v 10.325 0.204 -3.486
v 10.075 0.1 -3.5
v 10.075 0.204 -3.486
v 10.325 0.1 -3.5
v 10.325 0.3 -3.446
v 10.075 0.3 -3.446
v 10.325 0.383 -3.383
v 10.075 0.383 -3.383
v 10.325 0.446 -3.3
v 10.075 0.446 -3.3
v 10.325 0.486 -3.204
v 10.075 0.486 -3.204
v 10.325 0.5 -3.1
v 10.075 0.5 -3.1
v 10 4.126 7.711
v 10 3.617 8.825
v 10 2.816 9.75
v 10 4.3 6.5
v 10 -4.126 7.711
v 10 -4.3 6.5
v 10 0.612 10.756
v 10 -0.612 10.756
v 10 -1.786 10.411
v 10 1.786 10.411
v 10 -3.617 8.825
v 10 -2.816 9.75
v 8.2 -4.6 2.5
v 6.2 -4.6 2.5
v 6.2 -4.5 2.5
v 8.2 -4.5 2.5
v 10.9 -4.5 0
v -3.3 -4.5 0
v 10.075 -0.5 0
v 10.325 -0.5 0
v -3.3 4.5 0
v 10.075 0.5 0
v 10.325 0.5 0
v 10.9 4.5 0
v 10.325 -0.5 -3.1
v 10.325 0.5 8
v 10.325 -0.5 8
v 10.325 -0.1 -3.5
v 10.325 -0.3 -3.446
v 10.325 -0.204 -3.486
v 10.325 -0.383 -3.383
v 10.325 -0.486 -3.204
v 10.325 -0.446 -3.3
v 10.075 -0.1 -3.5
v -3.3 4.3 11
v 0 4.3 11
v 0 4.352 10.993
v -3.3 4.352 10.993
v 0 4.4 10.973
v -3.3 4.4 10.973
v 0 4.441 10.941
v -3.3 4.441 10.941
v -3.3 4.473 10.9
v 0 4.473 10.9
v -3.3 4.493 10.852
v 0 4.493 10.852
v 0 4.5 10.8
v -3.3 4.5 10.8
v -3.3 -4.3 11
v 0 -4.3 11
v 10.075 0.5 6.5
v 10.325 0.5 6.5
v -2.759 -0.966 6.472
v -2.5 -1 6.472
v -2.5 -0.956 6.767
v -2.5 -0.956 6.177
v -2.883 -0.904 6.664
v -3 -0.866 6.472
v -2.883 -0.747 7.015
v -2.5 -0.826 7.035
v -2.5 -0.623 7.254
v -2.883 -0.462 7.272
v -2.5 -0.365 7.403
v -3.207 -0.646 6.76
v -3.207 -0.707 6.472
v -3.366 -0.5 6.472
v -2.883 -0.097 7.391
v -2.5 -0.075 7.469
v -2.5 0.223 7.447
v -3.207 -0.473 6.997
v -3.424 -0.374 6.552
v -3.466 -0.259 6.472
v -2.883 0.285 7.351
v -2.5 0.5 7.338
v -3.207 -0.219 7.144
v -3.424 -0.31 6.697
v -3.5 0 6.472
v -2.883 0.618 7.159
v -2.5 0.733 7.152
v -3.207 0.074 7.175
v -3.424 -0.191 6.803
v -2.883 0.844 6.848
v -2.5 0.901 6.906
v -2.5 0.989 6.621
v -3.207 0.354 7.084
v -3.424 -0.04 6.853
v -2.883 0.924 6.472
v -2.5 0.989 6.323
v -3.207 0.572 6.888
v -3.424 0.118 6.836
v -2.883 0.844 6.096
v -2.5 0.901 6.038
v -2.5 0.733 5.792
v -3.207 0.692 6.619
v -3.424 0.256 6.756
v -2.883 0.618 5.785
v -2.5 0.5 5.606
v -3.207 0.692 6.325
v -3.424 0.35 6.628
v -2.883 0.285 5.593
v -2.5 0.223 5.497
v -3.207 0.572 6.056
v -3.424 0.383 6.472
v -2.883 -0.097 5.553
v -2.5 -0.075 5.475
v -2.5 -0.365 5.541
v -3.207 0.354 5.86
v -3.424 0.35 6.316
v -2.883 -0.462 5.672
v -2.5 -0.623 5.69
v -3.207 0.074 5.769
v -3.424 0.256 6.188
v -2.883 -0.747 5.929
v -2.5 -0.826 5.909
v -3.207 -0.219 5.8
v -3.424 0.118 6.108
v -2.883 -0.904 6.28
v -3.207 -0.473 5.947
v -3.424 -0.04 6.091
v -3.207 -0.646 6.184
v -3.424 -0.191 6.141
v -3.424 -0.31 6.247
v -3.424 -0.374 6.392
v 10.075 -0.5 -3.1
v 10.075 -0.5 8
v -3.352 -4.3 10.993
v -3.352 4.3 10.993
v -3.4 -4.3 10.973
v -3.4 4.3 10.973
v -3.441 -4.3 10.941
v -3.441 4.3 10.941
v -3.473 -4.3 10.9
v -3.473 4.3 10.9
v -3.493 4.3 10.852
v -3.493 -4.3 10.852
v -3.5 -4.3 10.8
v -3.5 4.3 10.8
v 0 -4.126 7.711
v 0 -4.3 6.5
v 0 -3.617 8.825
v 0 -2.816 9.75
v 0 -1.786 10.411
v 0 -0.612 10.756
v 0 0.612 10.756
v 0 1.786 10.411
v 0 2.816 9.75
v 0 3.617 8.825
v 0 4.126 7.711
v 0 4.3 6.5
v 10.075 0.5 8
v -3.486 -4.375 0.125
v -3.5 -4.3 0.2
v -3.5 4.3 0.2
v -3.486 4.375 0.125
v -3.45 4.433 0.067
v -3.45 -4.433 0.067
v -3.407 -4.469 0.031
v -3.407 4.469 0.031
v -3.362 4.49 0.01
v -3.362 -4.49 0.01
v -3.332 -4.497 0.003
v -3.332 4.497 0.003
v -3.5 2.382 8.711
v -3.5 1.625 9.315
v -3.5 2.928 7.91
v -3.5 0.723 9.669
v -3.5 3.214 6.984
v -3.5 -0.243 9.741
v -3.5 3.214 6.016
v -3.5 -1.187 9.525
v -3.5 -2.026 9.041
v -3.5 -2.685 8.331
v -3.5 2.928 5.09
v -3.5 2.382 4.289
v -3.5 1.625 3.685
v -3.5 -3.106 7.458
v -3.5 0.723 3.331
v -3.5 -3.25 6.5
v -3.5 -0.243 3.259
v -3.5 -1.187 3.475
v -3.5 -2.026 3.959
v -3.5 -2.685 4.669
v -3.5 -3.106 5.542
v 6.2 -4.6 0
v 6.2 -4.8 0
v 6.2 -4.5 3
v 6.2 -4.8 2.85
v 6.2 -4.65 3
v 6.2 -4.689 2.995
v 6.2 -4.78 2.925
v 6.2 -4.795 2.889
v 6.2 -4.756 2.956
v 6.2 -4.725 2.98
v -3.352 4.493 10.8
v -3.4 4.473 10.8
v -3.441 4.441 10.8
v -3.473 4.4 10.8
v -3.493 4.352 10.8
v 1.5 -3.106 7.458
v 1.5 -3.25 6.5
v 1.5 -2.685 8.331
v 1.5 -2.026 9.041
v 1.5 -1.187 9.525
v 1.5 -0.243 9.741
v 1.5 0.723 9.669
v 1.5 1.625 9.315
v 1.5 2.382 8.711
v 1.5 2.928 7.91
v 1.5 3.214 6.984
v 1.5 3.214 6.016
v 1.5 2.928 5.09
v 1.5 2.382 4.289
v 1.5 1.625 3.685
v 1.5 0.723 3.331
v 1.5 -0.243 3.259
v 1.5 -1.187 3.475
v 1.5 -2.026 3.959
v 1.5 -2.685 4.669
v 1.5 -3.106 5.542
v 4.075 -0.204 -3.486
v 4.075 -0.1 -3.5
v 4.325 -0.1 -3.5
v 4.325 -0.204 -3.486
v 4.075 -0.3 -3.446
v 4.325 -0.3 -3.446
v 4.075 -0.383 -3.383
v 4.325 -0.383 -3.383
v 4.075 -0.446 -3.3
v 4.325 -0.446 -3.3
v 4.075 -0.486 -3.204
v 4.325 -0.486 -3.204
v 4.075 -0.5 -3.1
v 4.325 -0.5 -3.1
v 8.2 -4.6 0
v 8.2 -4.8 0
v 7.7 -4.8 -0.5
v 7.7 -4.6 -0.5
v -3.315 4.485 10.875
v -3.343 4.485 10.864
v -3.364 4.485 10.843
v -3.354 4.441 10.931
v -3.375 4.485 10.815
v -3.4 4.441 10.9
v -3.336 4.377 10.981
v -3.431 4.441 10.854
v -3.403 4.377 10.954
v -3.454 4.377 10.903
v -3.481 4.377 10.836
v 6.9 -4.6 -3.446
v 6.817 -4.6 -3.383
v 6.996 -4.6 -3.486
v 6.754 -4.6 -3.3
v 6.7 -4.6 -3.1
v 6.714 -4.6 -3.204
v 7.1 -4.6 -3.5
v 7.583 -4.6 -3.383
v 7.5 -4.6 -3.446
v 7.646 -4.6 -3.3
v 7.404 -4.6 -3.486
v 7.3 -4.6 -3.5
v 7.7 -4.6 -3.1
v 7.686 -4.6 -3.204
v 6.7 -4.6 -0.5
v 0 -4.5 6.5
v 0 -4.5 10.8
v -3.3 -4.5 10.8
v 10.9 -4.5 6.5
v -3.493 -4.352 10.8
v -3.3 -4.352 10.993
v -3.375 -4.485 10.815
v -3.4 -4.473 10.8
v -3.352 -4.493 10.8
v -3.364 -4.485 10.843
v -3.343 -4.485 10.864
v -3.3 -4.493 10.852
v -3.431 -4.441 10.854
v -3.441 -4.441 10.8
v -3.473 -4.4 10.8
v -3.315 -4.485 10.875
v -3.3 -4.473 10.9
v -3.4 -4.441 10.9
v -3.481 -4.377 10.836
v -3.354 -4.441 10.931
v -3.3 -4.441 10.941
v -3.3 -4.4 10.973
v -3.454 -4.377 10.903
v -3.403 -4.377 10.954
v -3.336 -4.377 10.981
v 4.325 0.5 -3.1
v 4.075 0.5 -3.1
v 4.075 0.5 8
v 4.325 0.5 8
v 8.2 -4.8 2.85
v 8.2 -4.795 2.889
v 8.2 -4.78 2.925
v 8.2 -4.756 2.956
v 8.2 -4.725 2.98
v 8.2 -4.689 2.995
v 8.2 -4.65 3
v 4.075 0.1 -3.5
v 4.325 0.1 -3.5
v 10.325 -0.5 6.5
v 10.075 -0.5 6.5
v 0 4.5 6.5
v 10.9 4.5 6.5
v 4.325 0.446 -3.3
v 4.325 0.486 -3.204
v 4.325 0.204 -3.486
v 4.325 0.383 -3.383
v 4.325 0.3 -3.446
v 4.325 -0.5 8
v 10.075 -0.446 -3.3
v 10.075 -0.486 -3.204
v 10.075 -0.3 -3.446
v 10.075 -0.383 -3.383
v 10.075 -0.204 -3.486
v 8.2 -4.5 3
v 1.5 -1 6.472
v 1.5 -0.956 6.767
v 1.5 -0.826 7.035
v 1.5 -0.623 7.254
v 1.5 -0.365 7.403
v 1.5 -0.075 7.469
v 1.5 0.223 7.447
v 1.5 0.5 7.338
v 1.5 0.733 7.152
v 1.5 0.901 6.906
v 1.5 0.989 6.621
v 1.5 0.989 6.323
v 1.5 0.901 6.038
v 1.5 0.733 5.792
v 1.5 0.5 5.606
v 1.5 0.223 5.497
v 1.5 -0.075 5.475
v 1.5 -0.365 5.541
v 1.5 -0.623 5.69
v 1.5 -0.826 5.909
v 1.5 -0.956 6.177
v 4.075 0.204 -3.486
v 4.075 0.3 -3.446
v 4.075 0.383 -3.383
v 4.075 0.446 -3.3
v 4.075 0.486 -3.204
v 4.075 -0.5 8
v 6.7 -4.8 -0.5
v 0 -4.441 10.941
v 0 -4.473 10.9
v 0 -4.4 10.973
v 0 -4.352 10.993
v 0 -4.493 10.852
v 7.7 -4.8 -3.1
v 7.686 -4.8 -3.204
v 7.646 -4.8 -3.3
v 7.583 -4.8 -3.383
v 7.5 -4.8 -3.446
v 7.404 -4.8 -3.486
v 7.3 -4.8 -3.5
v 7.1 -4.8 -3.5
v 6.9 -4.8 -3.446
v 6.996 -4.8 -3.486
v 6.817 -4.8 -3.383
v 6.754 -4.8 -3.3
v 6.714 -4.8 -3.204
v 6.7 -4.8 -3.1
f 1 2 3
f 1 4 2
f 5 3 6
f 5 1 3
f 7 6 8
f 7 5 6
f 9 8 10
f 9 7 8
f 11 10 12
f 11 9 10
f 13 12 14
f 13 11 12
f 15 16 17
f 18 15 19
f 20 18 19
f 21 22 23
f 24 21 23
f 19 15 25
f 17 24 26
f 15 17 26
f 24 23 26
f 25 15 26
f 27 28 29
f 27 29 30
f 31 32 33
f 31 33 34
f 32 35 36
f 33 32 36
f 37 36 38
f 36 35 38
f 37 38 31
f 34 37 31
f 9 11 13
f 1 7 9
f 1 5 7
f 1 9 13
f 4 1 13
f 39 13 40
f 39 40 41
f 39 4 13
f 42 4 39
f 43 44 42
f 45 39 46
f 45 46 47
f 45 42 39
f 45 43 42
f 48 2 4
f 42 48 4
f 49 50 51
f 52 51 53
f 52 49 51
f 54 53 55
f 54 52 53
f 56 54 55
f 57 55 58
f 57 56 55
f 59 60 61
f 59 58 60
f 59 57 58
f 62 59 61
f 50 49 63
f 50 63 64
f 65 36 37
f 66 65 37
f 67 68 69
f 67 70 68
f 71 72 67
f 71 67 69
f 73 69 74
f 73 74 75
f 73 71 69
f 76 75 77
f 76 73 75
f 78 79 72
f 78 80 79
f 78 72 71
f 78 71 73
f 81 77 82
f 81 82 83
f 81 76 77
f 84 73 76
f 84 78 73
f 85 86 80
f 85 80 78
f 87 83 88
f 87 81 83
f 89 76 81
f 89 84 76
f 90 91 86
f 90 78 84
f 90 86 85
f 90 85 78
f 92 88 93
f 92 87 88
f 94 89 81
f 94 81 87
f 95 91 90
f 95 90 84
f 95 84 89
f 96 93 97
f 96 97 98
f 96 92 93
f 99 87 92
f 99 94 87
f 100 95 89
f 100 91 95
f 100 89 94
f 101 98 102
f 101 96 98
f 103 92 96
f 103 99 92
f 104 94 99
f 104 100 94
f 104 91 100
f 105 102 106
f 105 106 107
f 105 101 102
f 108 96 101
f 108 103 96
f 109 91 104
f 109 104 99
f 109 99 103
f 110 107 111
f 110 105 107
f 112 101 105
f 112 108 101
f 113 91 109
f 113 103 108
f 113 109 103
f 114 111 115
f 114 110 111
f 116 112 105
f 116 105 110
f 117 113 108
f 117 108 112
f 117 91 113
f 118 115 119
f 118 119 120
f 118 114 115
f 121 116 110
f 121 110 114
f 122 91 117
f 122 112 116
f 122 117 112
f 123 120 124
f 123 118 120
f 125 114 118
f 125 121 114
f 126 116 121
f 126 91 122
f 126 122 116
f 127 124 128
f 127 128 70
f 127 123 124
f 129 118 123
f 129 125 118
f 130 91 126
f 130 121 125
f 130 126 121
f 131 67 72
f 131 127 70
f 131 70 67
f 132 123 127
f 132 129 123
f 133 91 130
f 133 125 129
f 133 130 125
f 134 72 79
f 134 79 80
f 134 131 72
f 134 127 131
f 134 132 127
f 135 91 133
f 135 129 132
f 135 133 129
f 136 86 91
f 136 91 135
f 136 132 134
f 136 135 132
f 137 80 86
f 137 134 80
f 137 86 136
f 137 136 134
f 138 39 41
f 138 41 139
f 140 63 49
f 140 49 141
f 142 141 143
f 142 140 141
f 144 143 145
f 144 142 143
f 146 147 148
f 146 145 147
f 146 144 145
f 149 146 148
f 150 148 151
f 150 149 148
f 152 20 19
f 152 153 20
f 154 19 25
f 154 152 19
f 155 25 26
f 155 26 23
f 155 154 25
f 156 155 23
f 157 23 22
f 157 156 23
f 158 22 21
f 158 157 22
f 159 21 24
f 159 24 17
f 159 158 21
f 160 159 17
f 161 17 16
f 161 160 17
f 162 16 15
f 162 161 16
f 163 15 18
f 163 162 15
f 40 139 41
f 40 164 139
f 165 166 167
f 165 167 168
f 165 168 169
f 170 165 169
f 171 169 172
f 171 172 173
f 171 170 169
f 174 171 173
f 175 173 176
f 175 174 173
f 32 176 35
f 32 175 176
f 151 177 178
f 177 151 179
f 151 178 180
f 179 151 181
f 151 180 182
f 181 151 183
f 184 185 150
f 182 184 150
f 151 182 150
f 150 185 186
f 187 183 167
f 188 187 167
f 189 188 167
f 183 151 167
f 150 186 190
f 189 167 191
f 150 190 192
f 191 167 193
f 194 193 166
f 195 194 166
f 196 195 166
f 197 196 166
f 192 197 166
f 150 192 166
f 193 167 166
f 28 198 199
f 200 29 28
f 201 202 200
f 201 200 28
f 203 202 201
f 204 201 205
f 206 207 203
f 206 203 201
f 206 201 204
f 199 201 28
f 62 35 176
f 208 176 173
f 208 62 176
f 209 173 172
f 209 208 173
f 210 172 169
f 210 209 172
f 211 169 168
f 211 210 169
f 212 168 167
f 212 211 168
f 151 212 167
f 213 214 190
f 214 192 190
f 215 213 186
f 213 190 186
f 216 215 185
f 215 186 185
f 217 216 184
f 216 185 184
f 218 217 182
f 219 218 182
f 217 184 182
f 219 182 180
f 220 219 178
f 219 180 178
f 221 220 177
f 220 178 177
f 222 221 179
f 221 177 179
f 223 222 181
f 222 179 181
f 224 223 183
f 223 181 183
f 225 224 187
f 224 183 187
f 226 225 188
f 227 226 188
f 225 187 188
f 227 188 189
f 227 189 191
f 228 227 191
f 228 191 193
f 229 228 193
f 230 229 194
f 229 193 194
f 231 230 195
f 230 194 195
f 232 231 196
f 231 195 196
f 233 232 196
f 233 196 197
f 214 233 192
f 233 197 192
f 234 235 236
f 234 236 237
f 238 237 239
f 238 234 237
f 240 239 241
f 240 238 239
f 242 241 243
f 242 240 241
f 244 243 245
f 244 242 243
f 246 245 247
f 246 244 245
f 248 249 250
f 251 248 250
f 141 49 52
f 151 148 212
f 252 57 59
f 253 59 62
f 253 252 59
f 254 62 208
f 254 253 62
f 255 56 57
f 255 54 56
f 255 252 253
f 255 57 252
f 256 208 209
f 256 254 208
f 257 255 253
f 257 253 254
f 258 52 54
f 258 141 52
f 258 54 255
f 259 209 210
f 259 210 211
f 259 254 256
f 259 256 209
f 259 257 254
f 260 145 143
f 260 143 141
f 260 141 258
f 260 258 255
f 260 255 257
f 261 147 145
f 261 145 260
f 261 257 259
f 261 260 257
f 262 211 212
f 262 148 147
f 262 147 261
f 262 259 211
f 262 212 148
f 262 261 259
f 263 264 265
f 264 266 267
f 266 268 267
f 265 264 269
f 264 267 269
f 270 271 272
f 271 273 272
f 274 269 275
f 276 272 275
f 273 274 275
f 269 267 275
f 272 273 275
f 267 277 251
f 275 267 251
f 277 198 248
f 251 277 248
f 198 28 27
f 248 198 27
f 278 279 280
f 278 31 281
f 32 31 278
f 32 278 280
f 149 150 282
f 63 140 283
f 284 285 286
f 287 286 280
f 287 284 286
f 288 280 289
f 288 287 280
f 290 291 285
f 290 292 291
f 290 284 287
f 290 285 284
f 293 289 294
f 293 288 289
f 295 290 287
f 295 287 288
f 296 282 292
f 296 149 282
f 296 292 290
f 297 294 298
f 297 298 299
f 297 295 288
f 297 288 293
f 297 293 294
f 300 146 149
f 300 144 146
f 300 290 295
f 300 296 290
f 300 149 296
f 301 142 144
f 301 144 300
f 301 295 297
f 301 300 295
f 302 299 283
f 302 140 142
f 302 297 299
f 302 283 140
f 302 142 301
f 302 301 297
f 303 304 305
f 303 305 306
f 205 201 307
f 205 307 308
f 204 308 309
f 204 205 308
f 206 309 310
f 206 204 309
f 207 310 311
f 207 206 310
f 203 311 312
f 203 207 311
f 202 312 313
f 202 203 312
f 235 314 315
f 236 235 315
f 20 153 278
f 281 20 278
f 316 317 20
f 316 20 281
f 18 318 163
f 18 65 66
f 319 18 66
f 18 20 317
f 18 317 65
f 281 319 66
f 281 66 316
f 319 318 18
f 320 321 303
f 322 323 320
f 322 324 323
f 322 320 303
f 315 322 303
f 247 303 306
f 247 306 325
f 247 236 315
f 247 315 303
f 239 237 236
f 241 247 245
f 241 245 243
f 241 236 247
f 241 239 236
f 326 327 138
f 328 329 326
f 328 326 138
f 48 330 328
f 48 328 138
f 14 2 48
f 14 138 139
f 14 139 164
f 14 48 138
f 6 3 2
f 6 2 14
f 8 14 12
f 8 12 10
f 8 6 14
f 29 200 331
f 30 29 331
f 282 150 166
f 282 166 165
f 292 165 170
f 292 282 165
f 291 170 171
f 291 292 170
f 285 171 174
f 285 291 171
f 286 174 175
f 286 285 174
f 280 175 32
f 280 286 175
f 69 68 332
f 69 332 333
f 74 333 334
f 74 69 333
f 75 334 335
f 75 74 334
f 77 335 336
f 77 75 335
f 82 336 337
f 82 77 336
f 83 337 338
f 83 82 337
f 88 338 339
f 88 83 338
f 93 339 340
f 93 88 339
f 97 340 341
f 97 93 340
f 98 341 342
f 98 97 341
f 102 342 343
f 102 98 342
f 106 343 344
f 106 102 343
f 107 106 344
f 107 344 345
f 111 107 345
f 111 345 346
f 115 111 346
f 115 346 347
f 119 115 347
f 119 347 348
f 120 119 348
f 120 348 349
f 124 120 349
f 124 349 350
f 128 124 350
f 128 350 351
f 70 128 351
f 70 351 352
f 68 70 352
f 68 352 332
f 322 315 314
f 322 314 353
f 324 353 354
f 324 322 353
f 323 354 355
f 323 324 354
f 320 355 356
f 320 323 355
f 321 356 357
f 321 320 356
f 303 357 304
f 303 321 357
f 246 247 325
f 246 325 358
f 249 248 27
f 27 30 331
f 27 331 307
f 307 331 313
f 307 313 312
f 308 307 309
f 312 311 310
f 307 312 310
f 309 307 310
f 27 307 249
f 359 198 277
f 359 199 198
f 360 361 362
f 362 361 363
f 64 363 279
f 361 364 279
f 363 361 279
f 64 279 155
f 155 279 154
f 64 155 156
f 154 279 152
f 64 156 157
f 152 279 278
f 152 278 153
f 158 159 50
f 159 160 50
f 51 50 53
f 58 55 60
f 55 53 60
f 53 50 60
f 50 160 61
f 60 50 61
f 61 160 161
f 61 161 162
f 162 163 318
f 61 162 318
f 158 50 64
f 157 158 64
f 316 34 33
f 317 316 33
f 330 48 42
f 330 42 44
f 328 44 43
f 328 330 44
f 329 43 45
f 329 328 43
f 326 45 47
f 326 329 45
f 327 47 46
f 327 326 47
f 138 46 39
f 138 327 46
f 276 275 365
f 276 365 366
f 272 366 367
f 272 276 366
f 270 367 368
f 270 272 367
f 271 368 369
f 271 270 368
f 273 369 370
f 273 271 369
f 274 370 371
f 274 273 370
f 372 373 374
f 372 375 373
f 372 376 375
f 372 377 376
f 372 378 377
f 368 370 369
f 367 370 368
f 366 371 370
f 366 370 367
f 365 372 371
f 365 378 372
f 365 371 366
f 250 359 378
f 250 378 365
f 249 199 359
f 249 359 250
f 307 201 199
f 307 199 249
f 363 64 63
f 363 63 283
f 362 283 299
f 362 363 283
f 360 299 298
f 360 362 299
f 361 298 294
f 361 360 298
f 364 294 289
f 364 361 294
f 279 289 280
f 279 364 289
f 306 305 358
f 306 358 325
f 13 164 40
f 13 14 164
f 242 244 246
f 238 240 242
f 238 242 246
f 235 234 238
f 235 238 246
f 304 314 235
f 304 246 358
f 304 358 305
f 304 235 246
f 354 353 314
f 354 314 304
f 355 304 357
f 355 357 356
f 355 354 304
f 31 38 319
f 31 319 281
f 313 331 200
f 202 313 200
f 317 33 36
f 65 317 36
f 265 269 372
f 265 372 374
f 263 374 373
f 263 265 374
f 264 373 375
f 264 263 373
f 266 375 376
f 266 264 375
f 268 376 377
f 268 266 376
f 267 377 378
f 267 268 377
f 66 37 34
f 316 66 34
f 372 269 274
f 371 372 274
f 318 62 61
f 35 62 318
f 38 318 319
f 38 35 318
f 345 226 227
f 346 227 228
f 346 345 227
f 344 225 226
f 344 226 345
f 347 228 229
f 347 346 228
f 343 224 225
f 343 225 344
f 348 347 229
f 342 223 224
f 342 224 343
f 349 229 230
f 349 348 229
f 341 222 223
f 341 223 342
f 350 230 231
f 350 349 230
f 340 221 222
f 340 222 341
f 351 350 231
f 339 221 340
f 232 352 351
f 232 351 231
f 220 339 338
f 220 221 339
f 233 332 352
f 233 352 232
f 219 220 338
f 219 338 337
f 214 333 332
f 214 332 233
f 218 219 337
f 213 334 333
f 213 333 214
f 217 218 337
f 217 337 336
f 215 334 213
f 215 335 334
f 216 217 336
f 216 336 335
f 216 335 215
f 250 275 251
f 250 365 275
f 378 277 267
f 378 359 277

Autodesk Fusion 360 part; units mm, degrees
sketch "Sketch1" plane through (0, 0, 0) normal (0, 0, 1) x (1, 0, 0)
  line L0 (0, 0) -> (0, 4.5)
  line L1 (0, 4.5) -> (-3.5, 4.5)
  line L2 (-3.5, 4.5) -> (-3.5, -4.5)
  line L3 (-3.5, -4.5) -> (0, -4.5)
  line L4 (0, -4.5) -> (0, 0)
  line L5 (0, 4.5) -> (10.9, 4.5)
  line L6 (10.9, 4.5) -> (10.9, -4.5)
  line L7 (10.9, -4.5) -> (0, -4.5)
  line L8 (0, -4.5) -> (0, 4.5)
  dimension "d1" = 4.5
  dimension "d2" = 3.5
  dimension "d3" = 9
  dimension "d4" = 10.9
  dimension "d5" = 9
extrude "Extrude1" add sketch "Sketch1" along normal blind 6.5 contours L0 L4 L5 L6 L7 L8 makes body 1
extrude "Extrude2" add sketch "Sketch1" along normal blind 11 contours L0 L1 L2 L3 L4 L8 bodies 1
sketch "Sketch2" plane through (-3.5, 0, 0) normal (-1, 0, 0) x (0, -1, 0)
  line L0 (-4.5, 0) -> (4.5, 0)
  line L1 (4.5, 0) -> (4.5, 11)
  line L2 (4.5, 11) -> (-4.5, 11)
  line L3 (-4.5, 11) -> (-4.5, 0)
  line L4 (0, 11) -> (0, 0) construction
  line L5 (-4.5, 6.5) -> (4.5, 6.5) construction
  circle A0 centre (0, 6.5) radius 4.3
  circle A1 centre (0, 6.5) radius 3.25
  circle A2 centre (0, 6.472) radius 1
  dimension "d10" = 8.6
  dimension "d11" = 6.5
  dimension "d14" = 2
extrude "Extrude3" add sketch "Sketch2" against normal blind 13.5 contours A0 | A1 | A2 bodies 1
extrude "Extrude4" cut sketch "Sketch2" against normal blind 5 contours A1 bodies 1
sketch "Sketch3" plane through (0, 0, 0) normal (0, 0, 1) x (1, 0, 0)
  line L0 (4.325, -0.5) -> (4.075, -0.5)
  line L1 (4.075, -0.5) -> (4.075, 0.5)
  line L2 (4.075, 0.5) -> (4.325, 0.5)
  line L3 (4.325, 0.5) -> (4.325, -0.5)
  line L4 (4.325, -0.5) -> (4.075, 0.5) construction
  line L5 (4.075, -0.5) -> (4.325, 0.5) construction
  line L6 (3.325, 0.5) -> (3.325, -0.5)
  line L7 (-3.5, 4.5) -> (-3.5, -4.5)
  line L8 (10.325, -0.5) -> (10.075, -0.5)
  line L9 (10.075, -0.5) -> (10.075, 0.5)
  line L10 (10.075, 0.5) -> (10.325, 0.5)
  line L11 (10.325, 0.5) -> (10.325, -0.5)
  line L12 (10.325, -0.5) -> (10.075, 0.5) construction
  line L13 (10.075, -0.5) -> (10.325, 0.5) construction
  point P0 (4.2, 0)
  point P1 (10.2, 0)
  dimension "d17" = 0.25
  dimension "d18" = 1
  dimension "d19" = 1
  dimension "d20" = 7.7
  dimension "d21" = 1
  dimension "d22" = 0.25
  dimension "d23" = 6
extrude "Extrude11" cut sketch "Sketch3" along normal blind 10 contours L8 L9 L10 L11 bodies 1
extrude "Extrude5" add sketch "Sketch3" along normal blind 8 and the other way blind 3.5 separate body makes body 2 at (4.325, -0.1667, 4.1667) makes body 3 at (10.325, -0.1667, 4.1667)
sketch "Sketch4" plane through (0, -4.5, 0) normal (0, -1, 0) x (1, 0, 0)
  line L0 (-3.5, 0) -> (10.9, 0)
  line L1 (10.9, 0) -> (10.9, 6.5)
  line L2 (10.9, 6.5) -> (0, 6.5)
  line L3 (0, 6.5) -> (0, 11)
  line L4 (0, 11) -> (-3.5, 11)
  line L5 (-3.5, 11) -> (-3.5, 0)
  line L6 (8.2, 3) -> (6.2, 3)
  line L7 (6.2, 3) -> (6.2, 0)
  line L8 (6.2, 0) -> (8.2, 0)
  line L9 (8.2, 0) -> (8.2, 3)
  line L10 (8.2, 3) -> (6.2, 0) construction
  line L11 (6.2, 3) -> (8.2, 0) construction
  line L12 (-3.5, 11) -> (-3.5, 0)
  line L13 (10.9, 0) -> (0, 0)
  point P0 (7.2, 1.5)
  dimension "d26" = 2
  dimension "d27" = 3
  dimension "d28" = 10.7
  dimension "d29" = 1.5
extrude "Extrude6" add sketch "Sketch4" along normal blind 0.3 separate body contours L0 L6 L7 L8 L9 L13 makes body 4
sketch "Sketch5" plane through (0, 0, 0) normal (0, 0, -1) x (1, 0, 0)
  line L0 (6.2, 4.6) -> (8.2, 4.6)
  line L1 (6.2, 4.5) -> (8.2, 4.5)
  line L2 (8.2, 4.5) -> (8.2, 4.8)
  line L3 (8.2, 4.8) -> (6.2, 4.8)
  line L4 (6.2, 4.8) -> (6.2, 4.5)
extrude "Extrude10" cut sketch "Sketch5" against normal blind 2.5 contours L0 L1 L2 L4 bodies 4
extrude "Extrude8" add 1 faces at (7.5333, -4.7333, 0) along direction (0, 0, -1) blind 3.5 on bodies 4 bodies 4
sketch "Sketch6" plane through (0, -4.8, 0) normal (0, -1, 0) x (1, 0, 0)
  line L0 (8.2, -3.5) -> (8.2, 3)
  line L1 (8.2, 3) -> (6.2, 3)
  line L2 (6.2, 3) -> (6.2, -3.5)
  line L3 (6.2, -3.5) -> (8.2, -3.5)
  line L4 (7.7, 0) -> (6.7, 0)
  line L5 (6.7, 0) -> (6.7, -3.5)
  line L6 (6.7, -3.5) -> (7.7, -3.5)
  line L7 (7.7, -3.5) -> (7.7, 0)
  line L8 (7.7, 0) -> (6.7, -3.5) construction
  line L9 (6.7, 0) -> (7.7, -3.5) construction
  line L10 (6.2, 0) -> (6.7126, -0.5126)
  line L11 (8.2, -0.0002) -> (7.6389, -0.5613)
  line L12 (8.2, -0.0002) -> (8.9935, -0.0002) construction
  point P0 (7.2, -1.75)
  dimension "d36" = 1
  dimension "d37" = 3.5
  dimension "d38" = 1.75
  dimension "d39" = 1
  dimension "d41" = 135
extrude "Extrude9" cut sketch "Sketch6" against normal up to surface (0.2 mm away) contours L0 L3 L7 L11 | L2 L3 L5 L10 bodies 4
fillet "Fillet1" radius 0.4 6 edges at (4.2, -0.5, -3.5) (4.2, 0.5, -3.5) (10.2, -0.5, -3.5) (10.2, 0.5, -3.5) (7.7, -4.7, -3.5) (6.7, -4.7, -3.5) on bodies 2 3 4
fillet "Fillet2" radius 1 1 edges at (-3.5, 0.9323, 6.1104) on bodies 1
fillet "Fillet3" radius 0.2 6 edges at (-3.5, 0, 11) (-3.5, -4.5, 5.5) (-3.5, 4.5, 5.5) (-3.5, 0, 0) (-1.75, 4.5, 11) (-1.75, -4.5, 11) on bodies 1
fillet "Fillet4" radius 0.15 1 edges at (7.2, -4.8, 3) on bodies 4
equation "d4 = 14.4 mm - 3.5 mm"
equation "d20 = 10.7 mm - 3 mm"
equation "d38 = ( 3.5 / 2 ) * 1 mm"
